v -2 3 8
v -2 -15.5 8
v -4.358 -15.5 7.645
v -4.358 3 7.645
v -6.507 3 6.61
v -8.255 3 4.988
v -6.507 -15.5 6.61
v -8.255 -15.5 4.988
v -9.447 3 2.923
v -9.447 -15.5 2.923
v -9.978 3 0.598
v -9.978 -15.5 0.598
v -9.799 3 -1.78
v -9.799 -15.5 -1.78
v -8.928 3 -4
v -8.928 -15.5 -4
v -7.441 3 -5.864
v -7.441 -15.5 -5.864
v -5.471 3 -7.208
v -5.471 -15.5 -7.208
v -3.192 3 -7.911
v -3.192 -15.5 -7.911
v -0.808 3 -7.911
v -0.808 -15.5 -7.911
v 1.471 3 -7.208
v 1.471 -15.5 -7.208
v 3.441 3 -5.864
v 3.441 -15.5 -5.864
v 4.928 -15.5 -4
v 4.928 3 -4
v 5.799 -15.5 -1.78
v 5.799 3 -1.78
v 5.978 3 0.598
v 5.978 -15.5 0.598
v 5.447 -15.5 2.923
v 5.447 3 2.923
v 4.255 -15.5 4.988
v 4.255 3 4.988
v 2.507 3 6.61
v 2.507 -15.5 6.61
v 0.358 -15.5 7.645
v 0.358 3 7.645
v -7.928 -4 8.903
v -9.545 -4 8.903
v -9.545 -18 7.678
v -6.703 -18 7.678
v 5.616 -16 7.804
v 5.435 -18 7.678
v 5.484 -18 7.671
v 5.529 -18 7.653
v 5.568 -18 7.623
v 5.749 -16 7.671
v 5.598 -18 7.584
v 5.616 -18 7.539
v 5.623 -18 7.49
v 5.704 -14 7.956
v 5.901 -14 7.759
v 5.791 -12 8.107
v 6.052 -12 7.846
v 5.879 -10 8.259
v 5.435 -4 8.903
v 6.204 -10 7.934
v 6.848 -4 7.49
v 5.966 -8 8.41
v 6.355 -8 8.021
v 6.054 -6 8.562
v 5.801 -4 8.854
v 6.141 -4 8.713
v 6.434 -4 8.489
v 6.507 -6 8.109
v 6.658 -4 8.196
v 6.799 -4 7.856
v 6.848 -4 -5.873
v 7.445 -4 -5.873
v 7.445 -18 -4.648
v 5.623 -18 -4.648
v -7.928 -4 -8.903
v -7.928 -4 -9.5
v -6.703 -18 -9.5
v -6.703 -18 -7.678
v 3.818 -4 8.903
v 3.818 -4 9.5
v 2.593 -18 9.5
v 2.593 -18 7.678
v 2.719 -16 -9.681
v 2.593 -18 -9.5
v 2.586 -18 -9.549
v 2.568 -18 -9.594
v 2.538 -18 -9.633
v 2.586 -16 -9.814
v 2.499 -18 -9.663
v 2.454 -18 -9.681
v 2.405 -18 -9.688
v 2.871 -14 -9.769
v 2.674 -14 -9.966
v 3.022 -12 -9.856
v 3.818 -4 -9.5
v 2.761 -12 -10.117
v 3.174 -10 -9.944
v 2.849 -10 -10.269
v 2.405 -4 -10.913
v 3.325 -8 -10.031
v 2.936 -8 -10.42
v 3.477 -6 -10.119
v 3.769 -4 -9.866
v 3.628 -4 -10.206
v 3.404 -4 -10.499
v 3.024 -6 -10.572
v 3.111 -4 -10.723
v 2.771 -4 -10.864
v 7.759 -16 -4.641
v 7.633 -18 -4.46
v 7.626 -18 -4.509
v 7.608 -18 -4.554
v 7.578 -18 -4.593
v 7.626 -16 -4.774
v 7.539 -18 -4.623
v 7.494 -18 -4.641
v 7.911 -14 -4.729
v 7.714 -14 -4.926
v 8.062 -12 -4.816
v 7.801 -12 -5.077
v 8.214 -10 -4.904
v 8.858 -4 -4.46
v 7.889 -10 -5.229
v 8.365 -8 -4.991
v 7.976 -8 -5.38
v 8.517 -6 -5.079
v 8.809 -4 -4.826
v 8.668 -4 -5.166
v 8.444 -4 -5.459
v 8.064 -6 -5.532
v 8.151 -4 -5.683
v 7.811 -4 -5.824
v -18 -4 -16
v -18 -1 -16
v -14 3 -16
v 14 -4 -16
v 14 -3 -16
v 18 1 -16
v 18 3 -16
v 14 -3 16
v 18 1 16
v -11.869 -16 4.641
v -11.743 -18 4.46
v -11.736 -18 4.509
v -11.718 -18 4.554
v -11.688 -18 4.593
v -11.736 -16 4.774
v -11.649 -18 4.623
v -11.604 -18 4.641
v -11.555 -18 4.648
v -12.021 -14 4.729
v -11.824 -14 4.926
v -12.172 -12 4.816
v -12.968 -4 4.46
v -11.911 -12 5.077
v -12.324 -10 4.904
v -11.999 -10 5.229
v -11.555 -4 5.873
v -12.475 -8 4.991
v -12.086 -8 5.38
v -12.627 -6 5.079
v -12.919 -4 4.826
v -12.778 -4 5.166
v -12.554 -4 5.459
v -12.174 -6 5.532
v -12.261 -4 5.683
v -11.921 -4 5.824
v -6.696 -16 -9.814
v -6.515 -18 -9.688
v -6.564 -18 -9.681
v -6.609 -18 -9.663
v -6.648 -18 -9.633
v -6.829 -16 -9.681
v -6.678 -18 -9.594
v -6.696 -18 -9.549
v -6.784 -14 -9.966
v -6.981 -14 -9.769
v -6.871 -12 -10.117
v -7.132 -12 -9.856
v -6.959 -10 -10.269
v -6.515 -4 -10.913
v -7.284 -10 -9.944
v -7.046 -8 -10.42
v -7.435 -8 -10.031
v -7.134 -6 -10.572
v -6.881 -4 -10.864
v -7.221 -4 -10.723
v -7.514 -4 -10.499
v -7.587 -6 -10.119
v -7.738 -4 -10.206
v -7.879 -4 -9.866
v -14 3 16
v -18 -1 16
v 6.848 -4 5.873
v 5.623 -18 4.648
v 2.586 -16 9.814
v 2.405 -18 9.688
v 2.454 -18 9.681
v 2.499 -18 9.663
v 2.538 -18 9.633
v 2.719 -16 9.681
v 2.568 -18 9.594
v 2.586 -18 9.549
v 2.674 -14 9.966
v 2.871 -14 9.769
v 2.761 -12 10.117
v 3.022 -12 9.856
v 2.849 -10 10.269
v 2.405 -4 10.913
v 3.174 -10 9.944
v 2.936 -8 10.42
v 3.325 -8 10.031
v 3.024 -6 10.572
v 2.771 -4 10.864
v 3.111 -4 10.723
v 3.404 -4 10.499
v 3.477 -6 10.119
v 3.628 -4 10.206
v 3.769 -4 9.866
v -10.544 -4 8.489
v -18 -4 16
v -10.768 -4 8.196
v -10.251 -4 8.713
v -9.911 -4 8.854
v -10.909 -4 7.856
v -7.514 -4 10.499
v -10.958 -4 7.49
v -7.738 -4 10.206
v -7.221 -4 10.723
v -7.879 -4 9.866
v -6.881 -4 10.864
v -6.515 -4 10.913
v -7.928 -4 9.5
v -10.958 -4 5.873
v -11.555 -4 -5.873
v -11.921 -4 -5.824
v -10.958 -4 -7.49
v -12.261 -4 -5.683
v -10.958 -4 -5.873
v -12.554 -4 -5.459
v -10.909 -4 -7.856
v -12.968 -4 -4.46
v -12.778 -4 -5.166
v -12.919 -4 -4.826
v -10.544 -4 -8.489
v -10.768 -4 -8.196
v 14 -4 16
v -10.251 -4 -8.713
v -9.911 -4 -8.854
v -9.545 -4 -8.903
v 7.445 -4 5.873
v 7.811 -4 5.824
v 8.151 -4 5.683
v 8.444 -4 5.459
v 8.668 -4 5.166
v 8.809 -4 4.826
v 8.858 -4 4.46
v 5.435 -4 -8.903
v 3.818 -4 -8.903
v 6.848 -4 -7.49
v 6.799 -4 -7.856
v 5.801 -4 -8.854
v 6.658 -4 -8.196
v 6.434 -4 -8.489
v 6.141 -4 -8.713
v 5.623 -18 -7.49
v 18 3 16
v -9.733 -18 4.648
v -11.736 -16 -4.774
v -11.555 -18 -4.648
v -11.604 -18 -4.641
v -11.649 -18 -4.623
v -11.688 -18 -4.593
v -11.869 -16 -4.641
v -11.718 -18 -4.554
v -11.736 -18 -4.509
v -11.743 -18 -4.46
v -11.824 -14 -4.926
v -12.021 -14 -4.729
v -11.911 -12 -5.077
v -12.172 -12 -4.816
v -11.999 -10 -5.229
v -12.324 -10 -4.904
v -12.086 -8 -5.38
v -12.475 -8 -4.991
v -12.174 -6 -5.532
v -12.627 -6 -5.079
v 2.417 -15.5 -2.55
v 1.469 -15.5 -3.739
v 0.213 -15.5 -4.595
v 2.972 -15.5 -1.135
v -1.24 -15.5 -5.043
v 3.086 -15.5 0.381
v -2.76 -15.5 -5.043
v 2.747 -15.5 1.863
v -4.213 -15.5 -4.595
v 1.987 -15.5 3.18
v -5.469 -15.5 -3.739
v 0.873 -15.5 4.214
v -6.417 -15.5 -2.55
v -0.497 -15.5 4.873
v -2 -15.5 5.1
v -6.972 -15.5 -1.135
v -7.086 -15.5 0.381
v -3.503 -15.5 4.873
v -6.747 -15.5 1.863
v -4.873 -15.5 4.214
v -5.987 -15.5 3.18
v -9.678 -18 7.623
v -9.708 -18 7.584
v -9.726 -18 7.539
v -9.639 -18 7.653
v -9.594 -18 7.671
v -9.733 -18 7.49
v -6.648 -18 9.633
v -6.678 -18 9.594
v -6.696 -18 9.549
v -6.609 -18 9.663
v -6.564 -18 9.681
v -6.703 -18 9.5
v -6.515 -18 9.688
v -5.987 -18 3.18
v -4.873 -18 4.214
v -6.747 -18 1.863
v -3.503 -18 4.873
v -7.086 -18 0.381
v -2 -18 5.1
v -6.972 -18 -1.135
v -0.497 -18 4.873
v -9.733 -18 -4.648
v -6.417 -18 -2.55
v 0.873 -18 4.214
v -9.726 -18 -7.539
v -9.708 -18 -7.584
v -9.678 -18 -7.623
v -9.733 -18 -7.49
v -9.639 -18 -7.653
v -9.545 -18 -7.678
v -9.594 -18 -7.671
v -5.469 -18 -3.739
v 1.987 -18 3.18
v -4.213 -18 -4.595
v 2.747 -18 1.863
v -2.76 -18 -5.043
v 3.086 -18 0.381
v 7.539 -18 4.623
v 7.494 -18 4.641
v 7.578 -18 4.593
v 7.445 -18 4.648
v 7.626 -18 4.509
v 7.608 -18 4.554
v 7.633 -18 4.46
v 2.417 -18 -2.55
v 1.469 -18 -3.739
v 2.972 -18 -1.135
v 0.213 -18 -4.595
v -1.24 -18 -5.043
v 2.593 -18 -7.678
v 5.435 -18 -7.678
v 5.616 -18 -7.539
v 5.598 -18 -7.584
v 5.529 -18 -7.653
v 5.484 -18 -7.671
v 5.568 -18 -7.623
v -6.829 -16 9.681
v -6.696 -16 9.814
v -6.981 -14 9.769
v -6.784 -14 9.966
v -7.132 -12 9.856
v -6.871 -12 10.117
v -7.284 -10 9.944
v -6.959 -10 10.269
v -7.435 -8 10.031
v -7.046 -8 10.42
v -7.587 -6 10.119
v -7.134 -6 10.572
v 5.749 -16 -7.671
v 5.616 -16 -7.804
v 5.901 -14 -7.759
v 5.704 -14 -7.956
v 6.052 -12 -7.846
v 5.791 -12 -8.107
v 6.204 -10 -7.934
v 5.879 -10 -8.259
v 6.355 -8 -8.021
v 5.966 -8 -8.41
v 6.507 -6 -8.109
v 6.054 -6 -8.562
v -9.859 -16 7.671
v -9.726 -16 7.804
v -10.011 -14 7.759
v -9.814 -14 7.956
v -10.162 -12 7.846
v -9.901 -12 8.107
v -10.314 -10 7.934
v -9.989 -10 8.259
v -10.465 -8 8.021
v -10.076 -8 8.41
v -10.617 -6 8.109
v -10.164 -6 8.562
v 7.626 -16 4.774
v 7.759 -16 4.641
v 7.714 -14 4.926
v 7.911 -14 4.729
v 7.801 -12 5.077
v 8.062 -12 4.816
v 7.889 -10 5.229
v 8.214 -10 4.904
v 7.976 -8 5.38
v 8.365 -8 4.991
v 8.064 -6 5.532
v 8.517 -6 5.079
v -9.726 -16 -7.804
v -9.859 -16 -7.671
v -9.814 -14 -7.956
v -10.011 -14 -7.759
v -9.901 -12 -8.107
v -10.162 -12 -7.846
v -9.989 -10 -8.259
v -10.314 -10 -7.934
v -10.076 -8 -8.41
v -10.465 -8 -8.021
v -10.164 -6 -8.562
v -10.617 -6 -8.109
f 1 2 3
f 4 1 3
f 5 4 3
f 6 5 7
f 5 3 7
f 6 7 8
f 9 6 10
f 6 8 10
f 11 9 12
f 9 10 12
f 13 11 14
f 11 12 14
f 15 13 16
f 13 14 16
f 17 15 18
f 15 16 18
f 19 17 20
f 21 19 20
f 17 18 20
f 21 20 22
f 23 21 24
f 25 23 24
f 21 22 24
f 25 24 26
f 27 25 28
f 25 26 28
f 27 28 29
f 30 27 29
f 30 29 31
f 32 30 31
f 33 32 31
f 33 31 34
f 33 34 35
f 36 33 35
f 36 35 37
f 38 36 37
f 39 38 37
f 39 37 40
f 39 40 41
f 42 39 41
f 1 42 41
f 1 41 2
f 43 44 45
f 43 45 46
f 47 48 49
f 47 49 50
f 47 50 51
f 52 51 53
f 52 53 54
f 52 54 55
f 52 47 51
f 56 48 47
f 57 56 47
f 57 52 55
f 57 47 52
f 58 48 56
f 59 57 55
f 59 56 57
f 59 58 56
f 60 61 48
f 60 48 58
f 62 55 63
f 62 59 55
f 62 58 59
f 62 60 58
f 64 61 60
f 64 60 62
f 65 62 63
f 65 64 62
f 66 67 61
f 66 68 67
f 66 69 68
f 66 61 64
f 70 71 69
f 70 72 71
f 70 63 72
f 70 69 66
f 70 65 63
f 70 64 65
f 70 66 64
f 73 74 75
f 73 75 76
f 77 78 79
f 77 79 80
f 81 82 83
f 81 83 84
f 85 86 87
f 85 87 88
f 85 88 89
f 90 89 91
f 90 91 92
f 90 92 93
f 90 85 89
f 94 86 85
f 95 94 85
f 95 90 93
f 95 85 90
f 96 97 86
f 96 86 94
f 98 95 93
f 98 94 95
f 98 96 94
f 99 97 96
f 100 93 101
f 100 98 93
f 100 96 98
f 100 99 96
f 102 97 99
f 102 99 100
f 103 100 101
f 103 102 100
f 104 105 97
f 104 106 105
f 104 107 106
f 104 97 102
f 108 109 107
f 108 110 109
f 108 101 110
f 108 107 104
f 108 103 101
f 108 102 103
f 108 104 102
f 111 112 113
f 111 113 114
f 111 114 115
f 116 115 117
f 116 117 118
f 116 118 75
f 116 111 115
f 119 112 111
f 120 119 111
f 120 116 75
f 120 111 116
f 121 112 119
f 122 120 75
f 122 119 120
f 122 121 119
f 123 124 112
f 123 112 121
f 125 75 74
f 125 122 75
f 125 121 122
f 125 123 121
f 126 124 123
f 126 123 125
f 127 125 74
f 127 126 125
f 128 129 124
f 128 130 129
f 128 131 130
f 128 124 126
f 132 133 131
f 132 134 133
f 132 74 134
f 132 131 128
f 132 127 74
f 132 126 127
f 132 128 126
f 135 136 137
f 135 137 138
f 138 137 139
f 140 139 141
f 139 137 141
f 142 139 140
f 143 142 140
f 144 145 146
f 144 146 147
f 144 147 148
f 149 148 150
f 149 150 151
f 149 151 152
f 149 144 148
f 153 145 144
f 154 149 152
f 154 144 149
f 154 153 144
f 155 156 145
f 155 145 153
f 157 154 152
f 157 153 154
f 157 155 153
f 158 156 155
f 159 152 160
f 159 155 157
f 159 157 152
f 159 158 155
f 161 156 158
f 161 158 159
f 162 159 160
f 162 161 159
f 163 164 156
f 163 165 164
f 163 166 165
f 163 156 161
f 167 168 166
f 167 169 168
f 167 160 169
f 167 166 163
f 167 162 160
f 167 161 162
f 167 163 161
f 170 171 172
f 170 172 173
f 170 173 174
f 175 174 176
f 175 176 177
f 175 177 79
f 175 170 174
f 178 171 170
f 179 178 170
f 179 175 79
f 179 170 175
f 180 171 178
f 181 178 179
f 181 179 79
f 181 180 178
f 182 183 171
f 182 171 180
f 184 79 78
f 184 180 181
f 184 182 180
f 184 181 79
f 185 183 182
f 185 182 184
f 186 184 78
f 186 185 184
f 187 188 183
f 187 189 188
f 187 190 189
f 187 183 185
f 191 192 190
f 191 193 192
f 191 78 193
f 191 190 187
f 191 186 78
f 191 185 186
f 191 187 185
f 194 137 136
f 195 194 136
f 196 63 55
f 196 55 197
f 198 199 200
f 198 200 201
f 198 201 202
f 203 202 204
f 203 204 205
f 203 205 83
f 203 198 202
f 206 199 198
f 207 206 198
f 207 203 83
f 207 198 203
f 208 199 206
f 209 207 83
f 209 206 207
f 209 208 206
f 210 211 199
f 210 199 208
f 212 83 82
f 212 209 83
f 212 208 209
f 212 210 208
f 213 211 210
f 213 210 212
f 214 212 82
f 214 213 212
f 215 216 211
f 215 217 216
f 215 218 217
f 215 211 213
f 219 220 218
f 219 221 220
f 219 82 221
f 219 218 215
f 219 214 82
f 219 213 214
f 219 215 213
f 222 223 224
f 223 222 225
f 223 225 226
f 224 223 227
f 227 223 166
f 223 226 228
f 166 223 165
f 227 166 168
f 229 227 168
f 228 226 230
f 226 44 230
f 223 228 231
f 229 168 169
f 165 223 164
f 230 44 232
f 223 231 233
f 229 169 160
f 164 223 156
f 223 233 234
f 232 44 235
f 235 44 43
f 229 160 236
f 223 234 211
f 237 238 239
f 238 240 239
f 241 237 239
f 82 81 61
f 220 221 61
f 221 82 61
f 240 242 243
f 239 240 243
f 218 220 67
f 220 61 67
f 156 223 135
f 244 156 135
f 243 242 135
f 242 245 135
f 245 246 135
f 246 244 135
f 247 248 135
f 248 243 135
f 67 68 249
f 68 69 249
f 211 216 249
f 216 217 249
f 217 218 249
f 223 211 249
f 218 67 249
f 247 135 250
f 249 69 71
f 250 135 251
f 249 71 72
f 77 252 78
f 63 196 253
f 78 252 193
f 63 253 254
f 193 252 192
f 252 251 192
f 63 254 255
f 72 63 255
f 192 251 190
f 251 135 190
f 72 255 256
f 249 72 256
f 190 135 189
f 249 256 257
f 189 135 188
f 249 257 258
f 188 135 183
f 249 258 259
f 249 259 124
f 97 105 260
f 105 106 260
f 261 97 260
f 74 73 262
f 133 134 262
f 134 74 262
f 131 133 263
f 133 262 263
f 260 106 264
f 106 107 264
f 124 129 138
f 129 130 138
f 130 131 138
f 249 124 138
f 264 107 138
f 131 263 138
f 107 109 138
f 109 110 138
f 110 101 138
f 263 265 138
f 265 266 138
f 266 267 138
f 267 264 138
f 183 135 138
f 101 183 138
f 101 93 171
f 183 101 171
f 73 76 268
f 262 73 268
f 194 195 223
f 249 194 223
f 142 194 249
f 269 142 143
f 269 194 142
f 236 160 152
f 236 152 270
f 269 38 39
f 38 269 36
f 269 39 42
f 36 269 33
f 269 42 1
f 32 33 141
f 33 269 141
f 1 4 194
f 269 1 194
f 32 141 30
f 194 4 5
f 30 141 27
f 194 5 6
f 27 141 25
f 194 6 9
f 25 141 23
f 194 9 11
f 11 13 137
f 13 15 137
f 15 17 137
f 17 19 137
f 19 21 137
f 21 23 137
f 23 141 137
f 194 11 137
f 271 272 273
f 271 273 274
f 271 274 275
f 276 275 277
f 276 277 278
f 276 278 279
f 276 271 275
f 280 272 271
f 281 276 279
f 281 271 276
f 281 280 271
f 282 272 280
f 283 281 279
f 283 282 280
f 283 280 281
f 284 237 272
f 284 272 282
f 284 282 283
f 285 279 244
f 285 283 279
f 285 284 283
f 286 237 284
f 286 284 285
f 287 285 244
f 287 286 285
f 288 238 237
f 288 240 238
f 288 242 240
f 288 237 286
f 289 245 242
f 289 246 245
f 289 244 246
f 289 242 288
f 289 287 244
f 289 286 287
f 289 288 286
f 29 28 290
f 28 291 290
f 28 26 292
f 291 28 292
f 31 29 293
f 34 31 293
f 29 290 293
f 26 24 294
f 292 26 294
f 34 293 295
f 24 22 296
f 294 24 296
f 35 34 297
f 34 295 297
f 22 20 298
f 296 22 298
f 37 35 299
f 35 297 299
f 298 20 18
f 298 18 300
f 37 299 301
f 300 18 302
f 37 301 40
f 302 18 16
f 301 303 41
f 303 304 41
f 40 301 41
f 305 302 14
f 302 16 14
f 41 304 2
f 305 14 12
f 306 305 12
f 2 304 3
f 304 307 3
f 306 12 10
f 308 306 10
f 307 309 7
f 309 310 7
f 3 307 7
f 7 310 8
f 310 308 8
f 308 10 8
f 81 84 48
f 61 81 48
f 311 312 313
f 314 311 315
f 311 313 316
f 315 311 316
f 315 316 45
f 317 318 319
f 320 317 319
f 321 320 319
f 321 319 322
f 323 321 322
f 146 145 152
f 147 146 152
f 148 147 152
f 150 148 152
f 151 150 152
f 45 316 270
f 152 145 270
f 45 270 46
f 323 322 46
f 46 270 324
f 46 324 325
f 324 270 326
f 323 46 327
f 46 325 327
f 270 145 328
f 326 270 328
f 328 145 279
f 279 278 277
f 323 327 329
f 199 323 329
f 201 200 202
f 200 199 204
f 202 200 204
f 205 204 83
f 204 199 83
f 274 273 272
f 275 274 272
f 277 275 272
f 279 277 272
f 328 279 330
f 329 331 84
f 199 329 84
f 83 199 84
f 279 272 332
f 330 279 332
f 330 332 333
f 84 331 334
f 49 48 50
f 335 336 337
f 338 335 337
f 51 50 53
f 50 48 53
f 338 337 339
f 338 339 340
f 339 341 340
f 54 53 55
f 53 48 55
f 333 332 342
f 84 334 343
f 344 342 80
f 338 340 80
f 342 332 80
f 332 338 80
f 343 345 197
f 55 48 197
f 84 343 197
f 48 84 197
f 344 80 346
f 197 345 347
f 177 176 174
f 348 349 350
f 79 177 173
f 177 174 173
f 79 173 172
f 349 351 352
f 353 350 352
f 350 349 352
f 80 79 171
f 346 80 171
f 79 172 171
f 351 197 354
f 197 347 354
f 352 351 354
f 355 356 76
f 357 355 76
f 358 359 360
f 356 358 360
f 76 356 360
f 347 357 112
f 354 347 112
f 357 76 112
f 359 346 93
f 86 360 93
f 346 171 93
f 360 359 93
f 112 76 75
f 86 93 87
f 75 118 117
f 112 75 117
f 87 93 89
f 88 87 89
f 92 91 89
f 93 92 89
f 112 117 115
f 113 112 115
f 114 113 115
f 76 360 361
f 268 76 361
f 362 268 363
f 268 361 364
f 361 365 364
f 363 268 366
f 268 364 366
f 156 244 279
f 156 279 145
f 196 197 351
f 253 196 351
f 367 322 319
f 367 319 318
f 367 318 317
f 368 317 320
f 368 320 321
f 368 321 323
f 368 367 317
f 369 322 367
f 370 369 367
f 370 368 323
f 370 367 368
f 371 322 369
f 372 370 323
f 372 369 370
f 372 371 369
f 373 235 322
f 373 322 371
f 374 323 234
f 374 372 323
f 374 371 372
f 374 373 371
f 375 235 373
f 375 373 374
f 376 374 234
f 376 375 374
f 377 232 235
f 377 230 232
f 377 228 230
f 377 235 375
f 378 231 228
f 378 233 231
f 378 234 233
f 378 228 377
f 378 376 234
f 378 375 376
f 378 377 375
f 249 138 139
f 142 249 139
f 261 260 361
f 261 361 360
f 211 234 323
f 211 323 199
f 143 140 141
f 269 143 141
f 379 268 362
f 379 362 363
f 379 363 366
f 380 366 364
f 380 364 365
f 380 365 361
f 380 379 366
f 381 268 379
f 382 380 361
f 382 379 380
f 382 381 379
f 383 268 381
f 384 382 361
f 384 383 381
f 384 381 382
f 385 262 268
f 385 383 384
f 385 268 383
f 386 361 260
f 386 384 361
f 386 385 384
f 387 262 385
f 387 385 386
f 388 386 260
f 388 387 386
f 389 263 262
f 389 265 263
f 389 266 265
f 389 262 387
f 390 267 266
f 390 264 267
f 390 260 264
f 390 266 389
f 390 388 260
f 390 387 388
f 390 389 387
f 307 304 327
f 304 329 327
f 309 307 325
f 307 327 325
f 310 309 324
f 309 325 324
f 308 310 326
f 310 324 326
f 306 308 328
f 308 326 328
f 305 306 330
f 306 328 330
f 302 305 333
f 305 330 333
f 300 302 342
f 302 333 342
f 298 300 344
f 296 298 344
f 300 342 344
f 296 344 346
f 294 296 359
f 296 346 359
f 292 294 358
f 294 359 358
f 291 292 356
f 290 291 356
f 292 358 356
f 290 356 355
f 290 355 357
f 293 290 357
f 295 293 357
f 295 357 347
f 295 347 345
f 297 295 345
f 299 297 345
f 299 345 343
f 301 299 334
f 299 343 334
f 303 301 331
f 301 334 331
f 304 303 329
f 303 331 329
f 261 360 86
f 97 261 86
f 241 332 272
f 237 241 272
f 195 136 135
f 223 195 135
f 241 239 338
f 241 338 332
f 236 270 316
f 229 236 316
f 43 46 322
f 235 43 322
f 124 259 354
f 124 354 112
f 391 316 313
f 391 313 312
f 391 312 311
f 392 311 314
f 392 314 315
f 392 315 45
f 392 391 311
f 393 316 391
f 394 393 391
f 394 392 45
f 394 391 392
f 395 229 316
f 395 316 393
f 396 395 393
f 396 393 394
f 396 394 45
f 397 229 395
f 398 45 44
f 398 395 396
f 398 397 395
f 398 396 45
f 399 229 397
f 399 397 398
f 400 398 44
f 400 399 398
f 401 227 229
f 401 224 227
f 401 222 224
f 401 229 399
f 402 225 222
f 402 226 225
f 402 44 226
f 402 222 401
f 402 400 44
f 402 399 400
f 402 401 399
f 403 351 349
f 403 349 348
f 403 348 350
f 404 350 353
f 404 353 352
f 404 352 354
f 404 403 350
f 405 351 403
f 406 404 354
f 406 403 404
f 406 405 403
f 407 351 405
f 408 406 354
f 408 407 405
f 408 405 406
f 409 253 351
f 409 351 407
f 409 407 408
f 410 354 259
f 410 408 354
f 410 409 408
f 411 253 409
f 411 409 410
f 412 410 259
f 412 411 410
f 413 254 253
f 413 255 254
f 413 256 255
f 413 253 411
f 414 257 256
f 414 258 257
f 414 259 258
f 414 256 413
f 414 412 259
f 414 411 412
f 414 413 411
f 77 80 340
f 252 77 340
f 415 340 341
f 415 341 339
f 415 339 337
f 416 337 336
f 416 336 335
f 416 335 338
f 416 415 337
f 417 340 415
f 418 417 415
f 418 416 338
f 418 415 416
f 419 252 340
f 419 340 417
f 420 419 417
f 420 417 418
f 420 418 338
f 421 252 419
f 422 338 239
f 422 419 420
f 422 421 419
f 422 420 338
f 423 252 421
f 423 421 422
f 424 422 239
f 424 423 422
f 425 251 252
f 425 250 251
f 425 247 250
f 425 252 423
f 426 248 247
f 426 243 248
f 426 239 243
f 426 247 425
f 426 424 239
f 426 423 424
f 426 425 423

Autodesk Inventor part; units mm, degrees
sketch "Sketch_1" plane through (0, 0, 0) normal (0, 0, 1) x (1, 0, 0)
  line L0 (-18, -4) -> (14, -4)
  line L1 (14, -4) -> (14, -3)
  line L2 (14, -3) -> (18, 1)
  line L3 (18, 1) -> (18, 3)
  line L4 (18, 3) -> (-14, 3)
  line L5 (-14, 3) -> (-18, -1)
  line L6 (-18, -1) -> (-18, -4)
extrude "Extrusion1" add sketch "Sketch_1" along normal mid plane 32
sketch "Sketch_2" plane through (0, -3, 0) normal (0, 1, 0) x (1, 0, 0)
  arc A0 (-13.055, -4.46) -> (-11.555, -5.96) centre (-11.555, -4.46) ccw
  line L0 (-11.555, -5.96) -> (-11.045, -5.96)
  line L1 (-11.045, -5.96) -> (-11.045, -7.49)
  arc A1 (-11.045, -7.49) -> (-9.545, -8.99) centre (-9.545, -7.49) ccw
  line L2 (-9.545, -8.99) -> (-8.015, -8.99)
  line L3 (-8.015, -8.99) -> (-8.015, -9.5)
  arc A2 (-8.015, -9.5) -> (-6.515, -11) centre (-6.515, -9.5) ccw
  line L4 (-6.515, -11) -> (2.405, -11)
  arc A3 (2.405, -11) -> (3.905, -9.5) centre (2.405, -9.5) ccw
  line L5 (3.905, -9.5) -> (3.905, -8.99)
  line L6 (3.905, -8.99) -> (5.435, -8.99)
  arc A4 (5.435, -8.99) -> (6.935, -7.49) centre (5.435, -7.49) ccw
  line L7 (6.935, -7.49) -> (6.935, -5.96)
  line L8 (6.935, -5.96) -> (7.445, -5.96)
  arc A5 (7.445, -5.96) -> (8.945, -4.46) centre (7.445, -4.46) ccw
  line L9 (8.945, -4.46) -> (8.945, 4.46)
  arc A6 (8.945, 4.46) -> (7.445, 5.96) centre (7.445, 4.46) ccw
  line L10 (7.445, 5.96) -> (6.935, 5.96)
  line L11 (6.935, 5.96) -> (6.935, 7.49)
  arc A7 (6.935, 7.49) -> (5.435, 8.99) centre (5.435, 7.49) ccw
  line L12 (5.435, 8.99) -> (3.905, 8.99)
  line L13 (3.905, 8.99) -> (3.905, 9.5)
  arc A8 (3.905, 9.5) -> (2.405, 11) centre (2.405, 9.5) ccw
  line L14 (2.405, 11) -> (-6.515, 11)
  arc A9 (-6.515, 11) -> (-8.015, 9.5) centre (-6.515, 9.5) ccw
  line L15 (-8.015, 9.5) -> (-8.015, 8.99)
  line L16 (-8.015, 8.99) -> (-9.545, 8.99)
  arc A10 (-9.545, 8.99) -> (-11.045, 7.49) centre (-9.545, 7.49) ccw
  line L17 (-11.045, 7.49) -> (-11.045, 5.96)
  line L18 (-11.045, 5.96) -> (-11.555, 5.96)
  arc A11 (-11.555, 5.96) -> (-13.055, 4.46) centre (-11.555, 4.46) ccw
  line L19 (-13.055, 4.46) -> (-13.055, -4.46)
extrude "Extrusion2" add sketch "Sketch_2" against normal blind 15 draft -5
sketch "Sketch3" plane through (-14, 3, 16) normal (0, 1, 0) x (1, 0, 0)
  point P0 (12, 16)
hole "Hole1" at (-2, 3, 0) direction (0, -1, 0) diameter 10.2 depth 21 counterbore diameter 16 counterbore depth 18.5
ref_plane "insrt_to_lock_XY" through (-2, 3, 0) normal (0, 1, 0) x (1, 0, 0)
ref_plane "insrt_to_lock_YZ" through (-2, 3, 0) normal (1, 0, 0) x (0, 0, -1)
ref_plane "insrt_to_lock_ZX" through (-2, 3, 0) normal (0, 0, -1) x (0, 1, 0)
ref_plane "lock_to_body_XY" through (0, 3, 0) normal (0, 1, 0) x (1, 0, 0)
ref_plane "lock_to_body_YZ" through (0, 3, 0) normal (1, 0, 0) x (0, 0, -1)
ref_plane "lock_to_body_ZX" through (0, 3, 0) normal (0, 0, -1) x (0, 1, 0)
ref_plane "washer_XY" through (-2, -18.5, 0) normal (0, 1, 0) x (1, 0, 0)
ref_plane "washer_YZ" through (-2, -18.5, 0) normal (1, 0, 0) x (0, 0, -1)
ref_plane "washer_ZX" through (-2, -18.5, 0) normal (0, 0, -1) x (0, 1, 0)
properties part number "wm_one_door_lock_na"
